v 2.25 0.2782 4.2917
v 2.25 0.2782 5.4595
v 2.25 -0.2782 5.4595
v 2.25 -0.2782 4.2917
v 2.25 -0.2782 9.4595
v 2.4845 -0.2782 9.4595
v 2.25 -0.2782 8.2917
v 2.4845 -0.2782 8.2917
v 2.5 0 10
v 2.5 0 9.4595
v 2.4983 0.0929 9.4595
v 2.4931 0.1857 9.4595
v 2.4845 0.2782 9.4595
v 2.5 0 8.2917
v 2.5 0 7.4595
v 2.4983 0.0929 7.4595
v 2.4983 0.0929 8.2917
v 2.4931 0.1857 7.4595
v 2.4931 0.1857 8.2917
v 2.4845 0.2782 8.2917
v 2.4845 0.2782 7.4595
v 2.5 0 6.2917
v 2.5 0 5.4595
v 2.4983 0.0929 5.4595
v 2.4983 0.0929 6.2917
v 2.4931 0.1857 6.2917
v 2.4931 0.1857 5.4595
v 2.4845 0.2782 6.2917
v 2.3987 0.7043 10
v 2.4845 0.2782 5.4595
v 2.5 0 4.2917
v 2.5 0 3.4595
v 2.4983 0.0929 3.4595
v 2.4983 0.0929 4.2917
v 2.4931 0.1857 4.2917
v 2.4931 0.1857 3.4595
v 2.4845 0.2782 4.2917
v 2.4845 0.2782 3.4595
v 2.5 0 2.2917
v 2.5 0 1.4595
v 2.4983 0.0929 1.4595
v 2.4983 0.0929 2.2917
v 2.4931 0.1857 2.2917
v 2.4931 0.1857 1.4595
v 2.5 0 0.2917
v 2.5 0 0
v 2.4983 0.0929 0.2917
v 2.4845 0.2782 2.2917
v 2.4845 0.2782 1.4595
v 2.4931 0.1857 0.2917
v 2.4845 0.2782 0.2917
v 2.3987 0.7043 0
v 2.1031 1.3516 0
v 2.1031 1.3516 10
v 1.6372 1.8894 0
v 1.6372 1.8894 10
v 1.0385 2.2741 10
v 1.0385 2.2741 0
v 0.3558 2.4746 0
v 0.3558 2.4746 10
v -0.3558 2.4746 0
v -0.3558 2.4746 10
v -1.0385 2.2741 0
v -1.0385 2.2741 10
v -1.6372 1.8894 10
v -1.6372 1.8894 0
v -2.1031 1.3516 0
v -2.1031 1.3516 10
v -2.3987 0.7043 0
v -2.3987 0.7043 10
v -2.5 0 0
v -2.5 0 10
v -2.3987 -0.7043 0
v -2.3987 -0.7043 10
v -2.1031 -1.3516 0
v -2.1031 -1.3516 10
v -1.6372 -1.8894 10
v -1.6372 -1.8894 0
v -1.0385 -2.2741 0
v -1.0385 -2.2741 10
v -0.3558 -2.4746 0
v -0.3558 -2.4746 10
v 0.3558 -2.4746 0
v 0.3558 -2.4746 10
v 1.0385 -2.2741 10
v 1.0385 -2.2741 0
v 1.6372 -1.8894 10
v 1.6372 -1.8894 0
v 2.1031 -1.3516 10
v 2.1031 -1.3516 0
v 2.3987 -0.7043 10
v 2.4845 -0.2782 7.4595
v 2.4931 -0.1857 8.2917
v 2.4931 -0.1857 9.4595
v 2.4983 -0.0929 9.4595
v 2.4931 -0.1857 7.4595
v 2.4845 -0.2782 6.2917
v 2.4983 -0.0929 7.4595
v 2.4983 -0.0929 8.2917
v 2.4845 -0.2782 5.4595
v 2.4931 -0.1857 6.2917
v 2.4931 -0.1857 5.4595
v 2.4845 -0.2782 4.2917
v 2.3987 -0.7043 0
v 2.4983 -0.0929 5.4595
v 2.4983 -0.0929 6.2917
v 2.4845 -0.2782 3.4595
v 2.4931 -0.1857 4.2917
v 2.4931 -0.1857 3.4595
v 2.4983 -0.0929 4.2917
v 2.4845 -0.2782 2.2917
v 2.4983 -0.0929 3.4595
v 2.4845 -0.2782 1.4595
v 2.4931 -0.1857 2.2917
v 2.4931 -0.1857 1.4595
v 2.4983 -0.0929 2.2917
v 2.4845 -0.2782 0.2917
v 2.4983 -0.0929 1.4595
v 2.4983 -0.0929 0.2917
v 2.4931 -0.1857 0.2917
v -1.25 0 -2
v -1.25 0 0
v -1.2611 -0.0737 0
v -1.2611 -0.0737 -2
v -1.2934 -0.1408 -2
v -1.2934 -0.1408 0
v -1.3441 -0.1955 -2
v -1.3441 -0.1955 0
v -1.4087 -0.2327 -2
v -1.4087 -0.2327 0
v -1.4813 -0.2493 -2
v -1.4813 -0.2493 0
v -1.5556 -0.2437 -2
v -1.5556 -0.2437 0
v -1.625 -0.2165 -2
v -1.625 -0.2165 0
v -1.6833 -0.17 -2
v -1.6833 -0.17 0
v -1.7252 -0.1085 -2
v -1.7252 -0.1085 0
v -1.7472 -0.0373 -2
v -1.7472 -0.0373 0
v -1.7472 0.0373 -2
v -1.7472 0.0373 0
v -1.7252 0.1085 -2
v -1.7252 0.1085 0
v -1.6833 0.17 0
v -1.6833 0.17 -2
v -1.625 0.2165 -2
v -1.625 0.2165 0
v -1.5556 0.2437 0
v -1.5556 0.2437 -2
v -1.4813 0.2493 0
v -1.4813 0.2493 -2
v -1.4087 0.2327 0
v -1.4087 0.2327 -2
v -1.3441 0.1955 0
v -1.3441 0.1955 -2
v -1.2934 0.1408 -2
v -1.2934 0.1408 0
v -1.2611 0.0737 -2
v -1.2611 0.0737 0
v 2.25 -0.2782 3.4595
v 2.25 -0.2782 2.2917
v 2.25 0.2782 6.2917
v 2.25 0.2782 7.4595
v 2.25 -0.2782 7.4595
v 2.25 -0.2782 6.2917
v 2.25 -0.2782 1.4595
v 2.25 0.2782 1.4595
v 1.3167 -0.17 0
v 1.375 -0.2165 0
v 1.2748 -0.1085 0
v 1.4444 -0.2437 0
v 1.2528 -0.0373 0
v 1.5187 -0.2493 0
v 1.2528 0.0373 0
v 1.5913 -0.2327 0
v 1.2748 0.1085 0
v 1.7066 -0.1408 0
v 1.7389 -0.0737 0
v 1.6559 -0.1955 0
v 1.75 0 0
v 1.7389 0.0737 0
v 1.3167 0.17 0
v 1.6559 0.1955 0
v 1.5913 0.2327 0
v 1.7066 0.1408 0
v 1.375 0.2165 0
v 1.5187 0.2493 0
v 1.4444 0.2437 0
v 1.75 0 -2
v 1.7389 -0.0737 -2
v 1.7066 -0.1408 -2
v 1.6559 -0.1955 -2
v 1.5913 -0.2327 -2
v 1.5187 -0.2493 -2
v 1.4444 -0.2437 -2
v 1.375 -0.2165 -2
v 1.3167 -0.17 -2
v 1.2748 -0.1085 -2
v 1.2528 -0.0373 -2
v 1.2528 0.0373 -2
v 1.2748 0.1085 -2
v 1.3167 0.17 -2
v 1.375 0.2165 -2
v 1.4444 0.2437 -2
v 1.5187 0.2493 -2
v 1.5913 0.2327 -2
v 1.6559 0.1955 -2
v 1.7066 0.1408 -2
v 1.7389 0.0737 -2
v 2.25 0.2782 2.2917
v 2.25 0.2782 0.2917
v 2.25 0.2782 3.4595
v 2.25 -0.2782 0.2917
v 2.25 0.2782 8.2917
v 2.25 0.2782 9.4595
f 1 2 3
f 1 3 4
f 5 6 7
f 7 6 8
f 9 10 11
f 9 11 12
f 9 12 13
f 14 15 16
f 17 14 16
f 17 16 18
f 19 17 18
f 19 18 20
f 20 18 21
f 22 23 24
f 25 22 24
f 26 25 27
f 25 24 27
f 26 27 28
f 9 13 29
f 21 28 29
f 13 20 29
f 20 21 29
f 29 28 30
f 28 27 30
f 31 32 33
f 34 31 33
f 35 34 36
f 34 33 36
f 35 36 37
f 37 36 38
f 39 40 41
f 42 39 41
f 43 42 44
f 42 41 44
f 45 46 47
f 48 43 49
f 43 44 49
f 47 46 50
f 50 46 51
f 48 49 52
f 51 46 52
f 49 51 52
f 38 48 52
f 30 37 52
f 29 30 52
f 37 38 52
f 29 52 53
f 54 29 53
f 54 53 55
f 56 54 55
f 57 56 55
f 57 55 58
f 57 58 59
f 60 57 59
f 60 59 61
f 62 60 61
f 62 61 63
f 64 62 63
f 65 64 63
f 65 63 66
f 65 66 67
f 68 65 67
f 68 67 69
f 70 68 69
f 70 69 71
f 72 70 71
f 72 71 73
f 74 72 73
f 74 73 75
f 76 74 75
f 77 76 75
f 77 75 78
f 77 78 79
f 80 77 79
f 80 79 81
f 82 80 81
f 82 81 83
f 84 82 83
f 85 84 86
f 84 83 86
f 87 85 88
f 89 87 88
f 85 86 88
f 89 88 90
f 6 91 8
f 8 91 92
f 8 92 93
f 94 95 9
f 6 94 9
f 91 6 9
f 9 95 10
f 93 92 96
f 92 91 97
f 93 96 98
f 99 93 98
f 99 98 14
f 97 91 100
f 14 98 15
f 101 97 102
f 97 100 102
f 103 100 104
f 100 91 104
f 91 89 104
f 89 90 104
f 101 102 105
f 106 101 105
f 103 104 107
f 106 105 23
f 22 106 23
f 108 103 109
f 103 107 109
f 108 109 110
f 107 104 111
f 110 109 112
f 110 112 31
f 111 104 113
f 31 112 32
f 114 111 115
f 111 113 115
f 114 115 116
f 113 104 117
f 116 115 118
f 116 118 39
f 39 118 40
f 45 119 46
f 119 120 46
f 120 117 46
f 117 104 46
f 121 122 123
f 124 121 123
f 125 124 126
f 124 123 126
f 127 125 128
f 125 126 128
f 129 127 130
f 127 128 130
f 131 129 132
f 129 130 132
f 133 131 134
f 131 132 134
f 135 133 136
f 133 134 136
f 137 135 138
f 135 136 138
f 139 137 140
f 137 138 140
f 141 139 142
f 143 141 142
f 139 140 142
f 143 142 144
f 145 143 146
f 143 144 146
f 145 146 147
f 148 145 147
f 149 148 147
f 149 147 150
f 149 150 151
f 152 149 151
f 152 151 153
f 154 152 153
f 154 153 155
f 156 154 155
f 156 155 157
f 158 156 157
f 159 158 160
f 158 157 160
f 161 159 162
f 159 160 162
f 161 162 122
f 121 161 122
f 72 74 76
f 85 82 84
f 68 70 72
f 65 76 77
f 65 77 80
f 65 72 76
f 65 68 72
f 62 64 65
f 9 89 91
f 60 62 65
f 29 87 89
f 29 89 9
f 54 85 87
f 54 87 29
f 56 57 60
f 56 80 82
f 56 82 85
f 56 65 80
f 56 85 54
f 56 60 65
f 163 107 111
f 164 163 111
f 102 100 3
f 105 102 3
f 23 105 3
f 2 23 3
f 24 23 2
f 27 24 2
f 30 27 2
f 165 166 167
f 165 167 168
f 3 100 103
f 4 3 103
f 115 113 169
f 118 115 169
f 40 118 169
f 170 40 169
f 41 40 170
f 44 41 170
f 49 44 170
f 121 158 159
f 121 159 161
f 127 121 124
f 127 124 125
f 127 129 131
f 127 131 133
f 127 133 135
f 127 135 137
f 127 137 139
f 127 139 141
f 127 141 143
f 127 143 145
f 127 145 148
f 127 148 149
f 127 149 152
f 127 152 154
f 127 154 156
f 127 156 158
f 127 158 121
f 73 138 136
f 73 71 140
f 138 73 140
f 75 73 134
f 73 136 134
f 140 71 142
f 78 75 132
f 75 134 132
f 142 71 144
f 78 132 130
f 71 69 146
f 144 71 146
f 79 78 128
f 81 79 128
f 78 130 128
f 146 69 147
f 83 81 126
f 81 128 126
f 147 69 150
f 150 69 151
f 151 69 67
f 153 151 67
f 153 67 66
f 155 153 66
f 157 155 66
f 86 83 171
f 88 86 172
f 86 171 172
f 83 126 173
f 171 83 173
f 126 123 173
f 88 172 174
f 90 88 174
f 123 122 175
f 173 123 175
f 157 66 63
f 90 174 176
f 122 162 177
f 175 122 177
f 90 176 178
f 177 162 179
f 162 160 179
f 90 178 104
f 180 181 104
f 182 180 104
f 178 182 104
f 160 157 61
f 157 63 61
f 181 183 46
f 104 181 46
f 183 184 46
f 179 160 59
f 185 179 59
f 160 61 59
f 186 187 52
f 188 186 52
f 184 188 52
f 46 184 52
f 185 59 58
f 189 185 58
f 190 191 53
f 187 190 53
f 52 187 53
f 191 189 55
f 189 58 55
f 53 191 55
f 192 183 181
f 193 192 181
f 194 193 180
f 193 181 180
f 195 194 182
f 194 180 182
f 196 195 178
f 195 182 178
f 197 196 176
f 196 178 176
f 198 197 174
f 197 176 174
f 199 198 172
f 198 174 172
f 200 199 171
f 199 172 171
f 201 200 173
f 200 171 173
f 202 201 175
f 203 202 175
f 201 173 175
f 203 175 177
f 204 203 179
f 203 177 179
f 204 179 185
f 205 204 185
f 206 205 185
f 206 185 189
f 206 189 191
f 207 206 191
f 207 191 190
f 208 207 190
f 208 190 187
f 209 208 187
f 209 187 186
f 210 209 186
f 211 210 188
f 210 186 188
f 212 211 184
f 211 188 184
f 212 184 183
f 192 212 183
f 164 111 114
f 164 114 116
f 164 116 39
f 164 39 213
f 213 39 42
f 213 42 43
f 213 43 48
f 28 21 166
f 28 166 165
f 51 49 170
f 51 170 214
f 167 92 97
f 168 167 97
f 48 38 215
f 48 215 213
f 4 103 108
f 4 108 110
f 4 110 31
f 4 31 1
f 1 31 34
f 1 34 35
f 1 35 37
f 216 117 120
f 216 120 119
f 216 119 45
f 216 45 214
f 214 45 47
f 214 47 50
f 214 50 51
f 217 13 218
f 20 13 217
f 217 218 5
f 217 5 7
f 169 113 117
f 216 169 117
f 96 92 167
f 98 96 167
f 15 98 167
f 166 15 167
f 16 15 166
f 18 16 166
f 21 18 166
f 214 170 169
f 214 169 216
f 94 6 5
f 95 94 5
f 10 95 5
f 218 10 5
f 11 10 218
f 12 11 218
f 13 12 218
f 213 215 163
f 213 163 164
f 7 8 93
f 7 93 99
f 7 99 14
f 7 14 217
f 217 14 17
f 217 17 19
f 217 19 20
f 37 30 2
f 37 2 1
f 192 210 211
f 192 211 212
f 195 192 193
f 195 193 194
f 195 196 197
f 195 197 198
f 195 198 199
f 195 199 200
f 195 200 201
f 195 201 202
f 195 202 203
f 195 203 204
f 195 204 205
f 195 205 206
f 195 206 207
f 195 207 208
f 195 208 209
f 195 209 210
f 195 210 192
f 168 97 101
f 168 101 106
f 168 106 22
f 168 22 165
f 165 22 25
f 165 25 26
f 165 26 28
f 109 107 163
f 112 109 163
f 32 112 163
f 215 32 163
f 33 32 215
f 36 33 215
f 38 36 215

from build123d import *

# Parameters (mm, degrees)
SKETCH_1_R          = 2.5
EXTRUDE_1_DEPTH     = 10
SKETCH_2_R          = 0.25
EXTRUDE_2_DEPTH     = 2
SKETCH_3_W          = 1.167779505
SKETCH_3_H          = 0.556477286
CUT_EXTRUDE_1_DEPTH = 0.25


with BuildPart() as part:
    # 草图1 → 凸台-拉伸1 (new body)
    with BuildSketch(Plane.XY):
        Circle(SKETCH_1_R)
    extrude(amount=EXTRUDE_1_DEPTH)

    # 草图2 → 凸台-拉伸2 (add)
    with BuildSketch(Plane(origin=(0, 0, 0), x_dir=(-1, 0, 0), z_dir=(0, 0, -1))):
        with Locations(Location((-1.5, 0, 0), (0, 0, 180))):
            Circle(SKETCH_2_R)
        with Locations(Location((1.5, 0, 0), (0, 0, 180))):
            Circle(SKETCH_2_R)
    extrude(amount=EXTRUDE_2_DEPTH)

    # 草图3 → 切除-拉伸1 (cut)
    with BuildSketch(Plane(origin=(2.5, 0, 0), x_dir=(0, 0, -1), z_dir=(1, 0, 0))):
        with Locations((-8.875568116, 0)):
            Rectangle(SKETCH_3_W, SKETCH_3_H)
        with Locations((-6.875568116, 0)):
            Rectangle(SKETCH_3_W, SKETCH_3_H)
        with Locations((-4.875568116, 0)):
            Rectangle(SKETCH_3_W, SKETCH_3_H)
        with Locations((-2.875568116, 0)):
            Rectangle(SKETCH_3_W, SKETCH_3_H)
        with Locations((-0.875568116, 0)):
            Rectangle(SKETCH_3_W, SKETCH_3_H)
    extrude(amount=-CUT_EXTRUDE_1_DEPTH, mode=Mode.SUBTRACT)


solid = part.part
